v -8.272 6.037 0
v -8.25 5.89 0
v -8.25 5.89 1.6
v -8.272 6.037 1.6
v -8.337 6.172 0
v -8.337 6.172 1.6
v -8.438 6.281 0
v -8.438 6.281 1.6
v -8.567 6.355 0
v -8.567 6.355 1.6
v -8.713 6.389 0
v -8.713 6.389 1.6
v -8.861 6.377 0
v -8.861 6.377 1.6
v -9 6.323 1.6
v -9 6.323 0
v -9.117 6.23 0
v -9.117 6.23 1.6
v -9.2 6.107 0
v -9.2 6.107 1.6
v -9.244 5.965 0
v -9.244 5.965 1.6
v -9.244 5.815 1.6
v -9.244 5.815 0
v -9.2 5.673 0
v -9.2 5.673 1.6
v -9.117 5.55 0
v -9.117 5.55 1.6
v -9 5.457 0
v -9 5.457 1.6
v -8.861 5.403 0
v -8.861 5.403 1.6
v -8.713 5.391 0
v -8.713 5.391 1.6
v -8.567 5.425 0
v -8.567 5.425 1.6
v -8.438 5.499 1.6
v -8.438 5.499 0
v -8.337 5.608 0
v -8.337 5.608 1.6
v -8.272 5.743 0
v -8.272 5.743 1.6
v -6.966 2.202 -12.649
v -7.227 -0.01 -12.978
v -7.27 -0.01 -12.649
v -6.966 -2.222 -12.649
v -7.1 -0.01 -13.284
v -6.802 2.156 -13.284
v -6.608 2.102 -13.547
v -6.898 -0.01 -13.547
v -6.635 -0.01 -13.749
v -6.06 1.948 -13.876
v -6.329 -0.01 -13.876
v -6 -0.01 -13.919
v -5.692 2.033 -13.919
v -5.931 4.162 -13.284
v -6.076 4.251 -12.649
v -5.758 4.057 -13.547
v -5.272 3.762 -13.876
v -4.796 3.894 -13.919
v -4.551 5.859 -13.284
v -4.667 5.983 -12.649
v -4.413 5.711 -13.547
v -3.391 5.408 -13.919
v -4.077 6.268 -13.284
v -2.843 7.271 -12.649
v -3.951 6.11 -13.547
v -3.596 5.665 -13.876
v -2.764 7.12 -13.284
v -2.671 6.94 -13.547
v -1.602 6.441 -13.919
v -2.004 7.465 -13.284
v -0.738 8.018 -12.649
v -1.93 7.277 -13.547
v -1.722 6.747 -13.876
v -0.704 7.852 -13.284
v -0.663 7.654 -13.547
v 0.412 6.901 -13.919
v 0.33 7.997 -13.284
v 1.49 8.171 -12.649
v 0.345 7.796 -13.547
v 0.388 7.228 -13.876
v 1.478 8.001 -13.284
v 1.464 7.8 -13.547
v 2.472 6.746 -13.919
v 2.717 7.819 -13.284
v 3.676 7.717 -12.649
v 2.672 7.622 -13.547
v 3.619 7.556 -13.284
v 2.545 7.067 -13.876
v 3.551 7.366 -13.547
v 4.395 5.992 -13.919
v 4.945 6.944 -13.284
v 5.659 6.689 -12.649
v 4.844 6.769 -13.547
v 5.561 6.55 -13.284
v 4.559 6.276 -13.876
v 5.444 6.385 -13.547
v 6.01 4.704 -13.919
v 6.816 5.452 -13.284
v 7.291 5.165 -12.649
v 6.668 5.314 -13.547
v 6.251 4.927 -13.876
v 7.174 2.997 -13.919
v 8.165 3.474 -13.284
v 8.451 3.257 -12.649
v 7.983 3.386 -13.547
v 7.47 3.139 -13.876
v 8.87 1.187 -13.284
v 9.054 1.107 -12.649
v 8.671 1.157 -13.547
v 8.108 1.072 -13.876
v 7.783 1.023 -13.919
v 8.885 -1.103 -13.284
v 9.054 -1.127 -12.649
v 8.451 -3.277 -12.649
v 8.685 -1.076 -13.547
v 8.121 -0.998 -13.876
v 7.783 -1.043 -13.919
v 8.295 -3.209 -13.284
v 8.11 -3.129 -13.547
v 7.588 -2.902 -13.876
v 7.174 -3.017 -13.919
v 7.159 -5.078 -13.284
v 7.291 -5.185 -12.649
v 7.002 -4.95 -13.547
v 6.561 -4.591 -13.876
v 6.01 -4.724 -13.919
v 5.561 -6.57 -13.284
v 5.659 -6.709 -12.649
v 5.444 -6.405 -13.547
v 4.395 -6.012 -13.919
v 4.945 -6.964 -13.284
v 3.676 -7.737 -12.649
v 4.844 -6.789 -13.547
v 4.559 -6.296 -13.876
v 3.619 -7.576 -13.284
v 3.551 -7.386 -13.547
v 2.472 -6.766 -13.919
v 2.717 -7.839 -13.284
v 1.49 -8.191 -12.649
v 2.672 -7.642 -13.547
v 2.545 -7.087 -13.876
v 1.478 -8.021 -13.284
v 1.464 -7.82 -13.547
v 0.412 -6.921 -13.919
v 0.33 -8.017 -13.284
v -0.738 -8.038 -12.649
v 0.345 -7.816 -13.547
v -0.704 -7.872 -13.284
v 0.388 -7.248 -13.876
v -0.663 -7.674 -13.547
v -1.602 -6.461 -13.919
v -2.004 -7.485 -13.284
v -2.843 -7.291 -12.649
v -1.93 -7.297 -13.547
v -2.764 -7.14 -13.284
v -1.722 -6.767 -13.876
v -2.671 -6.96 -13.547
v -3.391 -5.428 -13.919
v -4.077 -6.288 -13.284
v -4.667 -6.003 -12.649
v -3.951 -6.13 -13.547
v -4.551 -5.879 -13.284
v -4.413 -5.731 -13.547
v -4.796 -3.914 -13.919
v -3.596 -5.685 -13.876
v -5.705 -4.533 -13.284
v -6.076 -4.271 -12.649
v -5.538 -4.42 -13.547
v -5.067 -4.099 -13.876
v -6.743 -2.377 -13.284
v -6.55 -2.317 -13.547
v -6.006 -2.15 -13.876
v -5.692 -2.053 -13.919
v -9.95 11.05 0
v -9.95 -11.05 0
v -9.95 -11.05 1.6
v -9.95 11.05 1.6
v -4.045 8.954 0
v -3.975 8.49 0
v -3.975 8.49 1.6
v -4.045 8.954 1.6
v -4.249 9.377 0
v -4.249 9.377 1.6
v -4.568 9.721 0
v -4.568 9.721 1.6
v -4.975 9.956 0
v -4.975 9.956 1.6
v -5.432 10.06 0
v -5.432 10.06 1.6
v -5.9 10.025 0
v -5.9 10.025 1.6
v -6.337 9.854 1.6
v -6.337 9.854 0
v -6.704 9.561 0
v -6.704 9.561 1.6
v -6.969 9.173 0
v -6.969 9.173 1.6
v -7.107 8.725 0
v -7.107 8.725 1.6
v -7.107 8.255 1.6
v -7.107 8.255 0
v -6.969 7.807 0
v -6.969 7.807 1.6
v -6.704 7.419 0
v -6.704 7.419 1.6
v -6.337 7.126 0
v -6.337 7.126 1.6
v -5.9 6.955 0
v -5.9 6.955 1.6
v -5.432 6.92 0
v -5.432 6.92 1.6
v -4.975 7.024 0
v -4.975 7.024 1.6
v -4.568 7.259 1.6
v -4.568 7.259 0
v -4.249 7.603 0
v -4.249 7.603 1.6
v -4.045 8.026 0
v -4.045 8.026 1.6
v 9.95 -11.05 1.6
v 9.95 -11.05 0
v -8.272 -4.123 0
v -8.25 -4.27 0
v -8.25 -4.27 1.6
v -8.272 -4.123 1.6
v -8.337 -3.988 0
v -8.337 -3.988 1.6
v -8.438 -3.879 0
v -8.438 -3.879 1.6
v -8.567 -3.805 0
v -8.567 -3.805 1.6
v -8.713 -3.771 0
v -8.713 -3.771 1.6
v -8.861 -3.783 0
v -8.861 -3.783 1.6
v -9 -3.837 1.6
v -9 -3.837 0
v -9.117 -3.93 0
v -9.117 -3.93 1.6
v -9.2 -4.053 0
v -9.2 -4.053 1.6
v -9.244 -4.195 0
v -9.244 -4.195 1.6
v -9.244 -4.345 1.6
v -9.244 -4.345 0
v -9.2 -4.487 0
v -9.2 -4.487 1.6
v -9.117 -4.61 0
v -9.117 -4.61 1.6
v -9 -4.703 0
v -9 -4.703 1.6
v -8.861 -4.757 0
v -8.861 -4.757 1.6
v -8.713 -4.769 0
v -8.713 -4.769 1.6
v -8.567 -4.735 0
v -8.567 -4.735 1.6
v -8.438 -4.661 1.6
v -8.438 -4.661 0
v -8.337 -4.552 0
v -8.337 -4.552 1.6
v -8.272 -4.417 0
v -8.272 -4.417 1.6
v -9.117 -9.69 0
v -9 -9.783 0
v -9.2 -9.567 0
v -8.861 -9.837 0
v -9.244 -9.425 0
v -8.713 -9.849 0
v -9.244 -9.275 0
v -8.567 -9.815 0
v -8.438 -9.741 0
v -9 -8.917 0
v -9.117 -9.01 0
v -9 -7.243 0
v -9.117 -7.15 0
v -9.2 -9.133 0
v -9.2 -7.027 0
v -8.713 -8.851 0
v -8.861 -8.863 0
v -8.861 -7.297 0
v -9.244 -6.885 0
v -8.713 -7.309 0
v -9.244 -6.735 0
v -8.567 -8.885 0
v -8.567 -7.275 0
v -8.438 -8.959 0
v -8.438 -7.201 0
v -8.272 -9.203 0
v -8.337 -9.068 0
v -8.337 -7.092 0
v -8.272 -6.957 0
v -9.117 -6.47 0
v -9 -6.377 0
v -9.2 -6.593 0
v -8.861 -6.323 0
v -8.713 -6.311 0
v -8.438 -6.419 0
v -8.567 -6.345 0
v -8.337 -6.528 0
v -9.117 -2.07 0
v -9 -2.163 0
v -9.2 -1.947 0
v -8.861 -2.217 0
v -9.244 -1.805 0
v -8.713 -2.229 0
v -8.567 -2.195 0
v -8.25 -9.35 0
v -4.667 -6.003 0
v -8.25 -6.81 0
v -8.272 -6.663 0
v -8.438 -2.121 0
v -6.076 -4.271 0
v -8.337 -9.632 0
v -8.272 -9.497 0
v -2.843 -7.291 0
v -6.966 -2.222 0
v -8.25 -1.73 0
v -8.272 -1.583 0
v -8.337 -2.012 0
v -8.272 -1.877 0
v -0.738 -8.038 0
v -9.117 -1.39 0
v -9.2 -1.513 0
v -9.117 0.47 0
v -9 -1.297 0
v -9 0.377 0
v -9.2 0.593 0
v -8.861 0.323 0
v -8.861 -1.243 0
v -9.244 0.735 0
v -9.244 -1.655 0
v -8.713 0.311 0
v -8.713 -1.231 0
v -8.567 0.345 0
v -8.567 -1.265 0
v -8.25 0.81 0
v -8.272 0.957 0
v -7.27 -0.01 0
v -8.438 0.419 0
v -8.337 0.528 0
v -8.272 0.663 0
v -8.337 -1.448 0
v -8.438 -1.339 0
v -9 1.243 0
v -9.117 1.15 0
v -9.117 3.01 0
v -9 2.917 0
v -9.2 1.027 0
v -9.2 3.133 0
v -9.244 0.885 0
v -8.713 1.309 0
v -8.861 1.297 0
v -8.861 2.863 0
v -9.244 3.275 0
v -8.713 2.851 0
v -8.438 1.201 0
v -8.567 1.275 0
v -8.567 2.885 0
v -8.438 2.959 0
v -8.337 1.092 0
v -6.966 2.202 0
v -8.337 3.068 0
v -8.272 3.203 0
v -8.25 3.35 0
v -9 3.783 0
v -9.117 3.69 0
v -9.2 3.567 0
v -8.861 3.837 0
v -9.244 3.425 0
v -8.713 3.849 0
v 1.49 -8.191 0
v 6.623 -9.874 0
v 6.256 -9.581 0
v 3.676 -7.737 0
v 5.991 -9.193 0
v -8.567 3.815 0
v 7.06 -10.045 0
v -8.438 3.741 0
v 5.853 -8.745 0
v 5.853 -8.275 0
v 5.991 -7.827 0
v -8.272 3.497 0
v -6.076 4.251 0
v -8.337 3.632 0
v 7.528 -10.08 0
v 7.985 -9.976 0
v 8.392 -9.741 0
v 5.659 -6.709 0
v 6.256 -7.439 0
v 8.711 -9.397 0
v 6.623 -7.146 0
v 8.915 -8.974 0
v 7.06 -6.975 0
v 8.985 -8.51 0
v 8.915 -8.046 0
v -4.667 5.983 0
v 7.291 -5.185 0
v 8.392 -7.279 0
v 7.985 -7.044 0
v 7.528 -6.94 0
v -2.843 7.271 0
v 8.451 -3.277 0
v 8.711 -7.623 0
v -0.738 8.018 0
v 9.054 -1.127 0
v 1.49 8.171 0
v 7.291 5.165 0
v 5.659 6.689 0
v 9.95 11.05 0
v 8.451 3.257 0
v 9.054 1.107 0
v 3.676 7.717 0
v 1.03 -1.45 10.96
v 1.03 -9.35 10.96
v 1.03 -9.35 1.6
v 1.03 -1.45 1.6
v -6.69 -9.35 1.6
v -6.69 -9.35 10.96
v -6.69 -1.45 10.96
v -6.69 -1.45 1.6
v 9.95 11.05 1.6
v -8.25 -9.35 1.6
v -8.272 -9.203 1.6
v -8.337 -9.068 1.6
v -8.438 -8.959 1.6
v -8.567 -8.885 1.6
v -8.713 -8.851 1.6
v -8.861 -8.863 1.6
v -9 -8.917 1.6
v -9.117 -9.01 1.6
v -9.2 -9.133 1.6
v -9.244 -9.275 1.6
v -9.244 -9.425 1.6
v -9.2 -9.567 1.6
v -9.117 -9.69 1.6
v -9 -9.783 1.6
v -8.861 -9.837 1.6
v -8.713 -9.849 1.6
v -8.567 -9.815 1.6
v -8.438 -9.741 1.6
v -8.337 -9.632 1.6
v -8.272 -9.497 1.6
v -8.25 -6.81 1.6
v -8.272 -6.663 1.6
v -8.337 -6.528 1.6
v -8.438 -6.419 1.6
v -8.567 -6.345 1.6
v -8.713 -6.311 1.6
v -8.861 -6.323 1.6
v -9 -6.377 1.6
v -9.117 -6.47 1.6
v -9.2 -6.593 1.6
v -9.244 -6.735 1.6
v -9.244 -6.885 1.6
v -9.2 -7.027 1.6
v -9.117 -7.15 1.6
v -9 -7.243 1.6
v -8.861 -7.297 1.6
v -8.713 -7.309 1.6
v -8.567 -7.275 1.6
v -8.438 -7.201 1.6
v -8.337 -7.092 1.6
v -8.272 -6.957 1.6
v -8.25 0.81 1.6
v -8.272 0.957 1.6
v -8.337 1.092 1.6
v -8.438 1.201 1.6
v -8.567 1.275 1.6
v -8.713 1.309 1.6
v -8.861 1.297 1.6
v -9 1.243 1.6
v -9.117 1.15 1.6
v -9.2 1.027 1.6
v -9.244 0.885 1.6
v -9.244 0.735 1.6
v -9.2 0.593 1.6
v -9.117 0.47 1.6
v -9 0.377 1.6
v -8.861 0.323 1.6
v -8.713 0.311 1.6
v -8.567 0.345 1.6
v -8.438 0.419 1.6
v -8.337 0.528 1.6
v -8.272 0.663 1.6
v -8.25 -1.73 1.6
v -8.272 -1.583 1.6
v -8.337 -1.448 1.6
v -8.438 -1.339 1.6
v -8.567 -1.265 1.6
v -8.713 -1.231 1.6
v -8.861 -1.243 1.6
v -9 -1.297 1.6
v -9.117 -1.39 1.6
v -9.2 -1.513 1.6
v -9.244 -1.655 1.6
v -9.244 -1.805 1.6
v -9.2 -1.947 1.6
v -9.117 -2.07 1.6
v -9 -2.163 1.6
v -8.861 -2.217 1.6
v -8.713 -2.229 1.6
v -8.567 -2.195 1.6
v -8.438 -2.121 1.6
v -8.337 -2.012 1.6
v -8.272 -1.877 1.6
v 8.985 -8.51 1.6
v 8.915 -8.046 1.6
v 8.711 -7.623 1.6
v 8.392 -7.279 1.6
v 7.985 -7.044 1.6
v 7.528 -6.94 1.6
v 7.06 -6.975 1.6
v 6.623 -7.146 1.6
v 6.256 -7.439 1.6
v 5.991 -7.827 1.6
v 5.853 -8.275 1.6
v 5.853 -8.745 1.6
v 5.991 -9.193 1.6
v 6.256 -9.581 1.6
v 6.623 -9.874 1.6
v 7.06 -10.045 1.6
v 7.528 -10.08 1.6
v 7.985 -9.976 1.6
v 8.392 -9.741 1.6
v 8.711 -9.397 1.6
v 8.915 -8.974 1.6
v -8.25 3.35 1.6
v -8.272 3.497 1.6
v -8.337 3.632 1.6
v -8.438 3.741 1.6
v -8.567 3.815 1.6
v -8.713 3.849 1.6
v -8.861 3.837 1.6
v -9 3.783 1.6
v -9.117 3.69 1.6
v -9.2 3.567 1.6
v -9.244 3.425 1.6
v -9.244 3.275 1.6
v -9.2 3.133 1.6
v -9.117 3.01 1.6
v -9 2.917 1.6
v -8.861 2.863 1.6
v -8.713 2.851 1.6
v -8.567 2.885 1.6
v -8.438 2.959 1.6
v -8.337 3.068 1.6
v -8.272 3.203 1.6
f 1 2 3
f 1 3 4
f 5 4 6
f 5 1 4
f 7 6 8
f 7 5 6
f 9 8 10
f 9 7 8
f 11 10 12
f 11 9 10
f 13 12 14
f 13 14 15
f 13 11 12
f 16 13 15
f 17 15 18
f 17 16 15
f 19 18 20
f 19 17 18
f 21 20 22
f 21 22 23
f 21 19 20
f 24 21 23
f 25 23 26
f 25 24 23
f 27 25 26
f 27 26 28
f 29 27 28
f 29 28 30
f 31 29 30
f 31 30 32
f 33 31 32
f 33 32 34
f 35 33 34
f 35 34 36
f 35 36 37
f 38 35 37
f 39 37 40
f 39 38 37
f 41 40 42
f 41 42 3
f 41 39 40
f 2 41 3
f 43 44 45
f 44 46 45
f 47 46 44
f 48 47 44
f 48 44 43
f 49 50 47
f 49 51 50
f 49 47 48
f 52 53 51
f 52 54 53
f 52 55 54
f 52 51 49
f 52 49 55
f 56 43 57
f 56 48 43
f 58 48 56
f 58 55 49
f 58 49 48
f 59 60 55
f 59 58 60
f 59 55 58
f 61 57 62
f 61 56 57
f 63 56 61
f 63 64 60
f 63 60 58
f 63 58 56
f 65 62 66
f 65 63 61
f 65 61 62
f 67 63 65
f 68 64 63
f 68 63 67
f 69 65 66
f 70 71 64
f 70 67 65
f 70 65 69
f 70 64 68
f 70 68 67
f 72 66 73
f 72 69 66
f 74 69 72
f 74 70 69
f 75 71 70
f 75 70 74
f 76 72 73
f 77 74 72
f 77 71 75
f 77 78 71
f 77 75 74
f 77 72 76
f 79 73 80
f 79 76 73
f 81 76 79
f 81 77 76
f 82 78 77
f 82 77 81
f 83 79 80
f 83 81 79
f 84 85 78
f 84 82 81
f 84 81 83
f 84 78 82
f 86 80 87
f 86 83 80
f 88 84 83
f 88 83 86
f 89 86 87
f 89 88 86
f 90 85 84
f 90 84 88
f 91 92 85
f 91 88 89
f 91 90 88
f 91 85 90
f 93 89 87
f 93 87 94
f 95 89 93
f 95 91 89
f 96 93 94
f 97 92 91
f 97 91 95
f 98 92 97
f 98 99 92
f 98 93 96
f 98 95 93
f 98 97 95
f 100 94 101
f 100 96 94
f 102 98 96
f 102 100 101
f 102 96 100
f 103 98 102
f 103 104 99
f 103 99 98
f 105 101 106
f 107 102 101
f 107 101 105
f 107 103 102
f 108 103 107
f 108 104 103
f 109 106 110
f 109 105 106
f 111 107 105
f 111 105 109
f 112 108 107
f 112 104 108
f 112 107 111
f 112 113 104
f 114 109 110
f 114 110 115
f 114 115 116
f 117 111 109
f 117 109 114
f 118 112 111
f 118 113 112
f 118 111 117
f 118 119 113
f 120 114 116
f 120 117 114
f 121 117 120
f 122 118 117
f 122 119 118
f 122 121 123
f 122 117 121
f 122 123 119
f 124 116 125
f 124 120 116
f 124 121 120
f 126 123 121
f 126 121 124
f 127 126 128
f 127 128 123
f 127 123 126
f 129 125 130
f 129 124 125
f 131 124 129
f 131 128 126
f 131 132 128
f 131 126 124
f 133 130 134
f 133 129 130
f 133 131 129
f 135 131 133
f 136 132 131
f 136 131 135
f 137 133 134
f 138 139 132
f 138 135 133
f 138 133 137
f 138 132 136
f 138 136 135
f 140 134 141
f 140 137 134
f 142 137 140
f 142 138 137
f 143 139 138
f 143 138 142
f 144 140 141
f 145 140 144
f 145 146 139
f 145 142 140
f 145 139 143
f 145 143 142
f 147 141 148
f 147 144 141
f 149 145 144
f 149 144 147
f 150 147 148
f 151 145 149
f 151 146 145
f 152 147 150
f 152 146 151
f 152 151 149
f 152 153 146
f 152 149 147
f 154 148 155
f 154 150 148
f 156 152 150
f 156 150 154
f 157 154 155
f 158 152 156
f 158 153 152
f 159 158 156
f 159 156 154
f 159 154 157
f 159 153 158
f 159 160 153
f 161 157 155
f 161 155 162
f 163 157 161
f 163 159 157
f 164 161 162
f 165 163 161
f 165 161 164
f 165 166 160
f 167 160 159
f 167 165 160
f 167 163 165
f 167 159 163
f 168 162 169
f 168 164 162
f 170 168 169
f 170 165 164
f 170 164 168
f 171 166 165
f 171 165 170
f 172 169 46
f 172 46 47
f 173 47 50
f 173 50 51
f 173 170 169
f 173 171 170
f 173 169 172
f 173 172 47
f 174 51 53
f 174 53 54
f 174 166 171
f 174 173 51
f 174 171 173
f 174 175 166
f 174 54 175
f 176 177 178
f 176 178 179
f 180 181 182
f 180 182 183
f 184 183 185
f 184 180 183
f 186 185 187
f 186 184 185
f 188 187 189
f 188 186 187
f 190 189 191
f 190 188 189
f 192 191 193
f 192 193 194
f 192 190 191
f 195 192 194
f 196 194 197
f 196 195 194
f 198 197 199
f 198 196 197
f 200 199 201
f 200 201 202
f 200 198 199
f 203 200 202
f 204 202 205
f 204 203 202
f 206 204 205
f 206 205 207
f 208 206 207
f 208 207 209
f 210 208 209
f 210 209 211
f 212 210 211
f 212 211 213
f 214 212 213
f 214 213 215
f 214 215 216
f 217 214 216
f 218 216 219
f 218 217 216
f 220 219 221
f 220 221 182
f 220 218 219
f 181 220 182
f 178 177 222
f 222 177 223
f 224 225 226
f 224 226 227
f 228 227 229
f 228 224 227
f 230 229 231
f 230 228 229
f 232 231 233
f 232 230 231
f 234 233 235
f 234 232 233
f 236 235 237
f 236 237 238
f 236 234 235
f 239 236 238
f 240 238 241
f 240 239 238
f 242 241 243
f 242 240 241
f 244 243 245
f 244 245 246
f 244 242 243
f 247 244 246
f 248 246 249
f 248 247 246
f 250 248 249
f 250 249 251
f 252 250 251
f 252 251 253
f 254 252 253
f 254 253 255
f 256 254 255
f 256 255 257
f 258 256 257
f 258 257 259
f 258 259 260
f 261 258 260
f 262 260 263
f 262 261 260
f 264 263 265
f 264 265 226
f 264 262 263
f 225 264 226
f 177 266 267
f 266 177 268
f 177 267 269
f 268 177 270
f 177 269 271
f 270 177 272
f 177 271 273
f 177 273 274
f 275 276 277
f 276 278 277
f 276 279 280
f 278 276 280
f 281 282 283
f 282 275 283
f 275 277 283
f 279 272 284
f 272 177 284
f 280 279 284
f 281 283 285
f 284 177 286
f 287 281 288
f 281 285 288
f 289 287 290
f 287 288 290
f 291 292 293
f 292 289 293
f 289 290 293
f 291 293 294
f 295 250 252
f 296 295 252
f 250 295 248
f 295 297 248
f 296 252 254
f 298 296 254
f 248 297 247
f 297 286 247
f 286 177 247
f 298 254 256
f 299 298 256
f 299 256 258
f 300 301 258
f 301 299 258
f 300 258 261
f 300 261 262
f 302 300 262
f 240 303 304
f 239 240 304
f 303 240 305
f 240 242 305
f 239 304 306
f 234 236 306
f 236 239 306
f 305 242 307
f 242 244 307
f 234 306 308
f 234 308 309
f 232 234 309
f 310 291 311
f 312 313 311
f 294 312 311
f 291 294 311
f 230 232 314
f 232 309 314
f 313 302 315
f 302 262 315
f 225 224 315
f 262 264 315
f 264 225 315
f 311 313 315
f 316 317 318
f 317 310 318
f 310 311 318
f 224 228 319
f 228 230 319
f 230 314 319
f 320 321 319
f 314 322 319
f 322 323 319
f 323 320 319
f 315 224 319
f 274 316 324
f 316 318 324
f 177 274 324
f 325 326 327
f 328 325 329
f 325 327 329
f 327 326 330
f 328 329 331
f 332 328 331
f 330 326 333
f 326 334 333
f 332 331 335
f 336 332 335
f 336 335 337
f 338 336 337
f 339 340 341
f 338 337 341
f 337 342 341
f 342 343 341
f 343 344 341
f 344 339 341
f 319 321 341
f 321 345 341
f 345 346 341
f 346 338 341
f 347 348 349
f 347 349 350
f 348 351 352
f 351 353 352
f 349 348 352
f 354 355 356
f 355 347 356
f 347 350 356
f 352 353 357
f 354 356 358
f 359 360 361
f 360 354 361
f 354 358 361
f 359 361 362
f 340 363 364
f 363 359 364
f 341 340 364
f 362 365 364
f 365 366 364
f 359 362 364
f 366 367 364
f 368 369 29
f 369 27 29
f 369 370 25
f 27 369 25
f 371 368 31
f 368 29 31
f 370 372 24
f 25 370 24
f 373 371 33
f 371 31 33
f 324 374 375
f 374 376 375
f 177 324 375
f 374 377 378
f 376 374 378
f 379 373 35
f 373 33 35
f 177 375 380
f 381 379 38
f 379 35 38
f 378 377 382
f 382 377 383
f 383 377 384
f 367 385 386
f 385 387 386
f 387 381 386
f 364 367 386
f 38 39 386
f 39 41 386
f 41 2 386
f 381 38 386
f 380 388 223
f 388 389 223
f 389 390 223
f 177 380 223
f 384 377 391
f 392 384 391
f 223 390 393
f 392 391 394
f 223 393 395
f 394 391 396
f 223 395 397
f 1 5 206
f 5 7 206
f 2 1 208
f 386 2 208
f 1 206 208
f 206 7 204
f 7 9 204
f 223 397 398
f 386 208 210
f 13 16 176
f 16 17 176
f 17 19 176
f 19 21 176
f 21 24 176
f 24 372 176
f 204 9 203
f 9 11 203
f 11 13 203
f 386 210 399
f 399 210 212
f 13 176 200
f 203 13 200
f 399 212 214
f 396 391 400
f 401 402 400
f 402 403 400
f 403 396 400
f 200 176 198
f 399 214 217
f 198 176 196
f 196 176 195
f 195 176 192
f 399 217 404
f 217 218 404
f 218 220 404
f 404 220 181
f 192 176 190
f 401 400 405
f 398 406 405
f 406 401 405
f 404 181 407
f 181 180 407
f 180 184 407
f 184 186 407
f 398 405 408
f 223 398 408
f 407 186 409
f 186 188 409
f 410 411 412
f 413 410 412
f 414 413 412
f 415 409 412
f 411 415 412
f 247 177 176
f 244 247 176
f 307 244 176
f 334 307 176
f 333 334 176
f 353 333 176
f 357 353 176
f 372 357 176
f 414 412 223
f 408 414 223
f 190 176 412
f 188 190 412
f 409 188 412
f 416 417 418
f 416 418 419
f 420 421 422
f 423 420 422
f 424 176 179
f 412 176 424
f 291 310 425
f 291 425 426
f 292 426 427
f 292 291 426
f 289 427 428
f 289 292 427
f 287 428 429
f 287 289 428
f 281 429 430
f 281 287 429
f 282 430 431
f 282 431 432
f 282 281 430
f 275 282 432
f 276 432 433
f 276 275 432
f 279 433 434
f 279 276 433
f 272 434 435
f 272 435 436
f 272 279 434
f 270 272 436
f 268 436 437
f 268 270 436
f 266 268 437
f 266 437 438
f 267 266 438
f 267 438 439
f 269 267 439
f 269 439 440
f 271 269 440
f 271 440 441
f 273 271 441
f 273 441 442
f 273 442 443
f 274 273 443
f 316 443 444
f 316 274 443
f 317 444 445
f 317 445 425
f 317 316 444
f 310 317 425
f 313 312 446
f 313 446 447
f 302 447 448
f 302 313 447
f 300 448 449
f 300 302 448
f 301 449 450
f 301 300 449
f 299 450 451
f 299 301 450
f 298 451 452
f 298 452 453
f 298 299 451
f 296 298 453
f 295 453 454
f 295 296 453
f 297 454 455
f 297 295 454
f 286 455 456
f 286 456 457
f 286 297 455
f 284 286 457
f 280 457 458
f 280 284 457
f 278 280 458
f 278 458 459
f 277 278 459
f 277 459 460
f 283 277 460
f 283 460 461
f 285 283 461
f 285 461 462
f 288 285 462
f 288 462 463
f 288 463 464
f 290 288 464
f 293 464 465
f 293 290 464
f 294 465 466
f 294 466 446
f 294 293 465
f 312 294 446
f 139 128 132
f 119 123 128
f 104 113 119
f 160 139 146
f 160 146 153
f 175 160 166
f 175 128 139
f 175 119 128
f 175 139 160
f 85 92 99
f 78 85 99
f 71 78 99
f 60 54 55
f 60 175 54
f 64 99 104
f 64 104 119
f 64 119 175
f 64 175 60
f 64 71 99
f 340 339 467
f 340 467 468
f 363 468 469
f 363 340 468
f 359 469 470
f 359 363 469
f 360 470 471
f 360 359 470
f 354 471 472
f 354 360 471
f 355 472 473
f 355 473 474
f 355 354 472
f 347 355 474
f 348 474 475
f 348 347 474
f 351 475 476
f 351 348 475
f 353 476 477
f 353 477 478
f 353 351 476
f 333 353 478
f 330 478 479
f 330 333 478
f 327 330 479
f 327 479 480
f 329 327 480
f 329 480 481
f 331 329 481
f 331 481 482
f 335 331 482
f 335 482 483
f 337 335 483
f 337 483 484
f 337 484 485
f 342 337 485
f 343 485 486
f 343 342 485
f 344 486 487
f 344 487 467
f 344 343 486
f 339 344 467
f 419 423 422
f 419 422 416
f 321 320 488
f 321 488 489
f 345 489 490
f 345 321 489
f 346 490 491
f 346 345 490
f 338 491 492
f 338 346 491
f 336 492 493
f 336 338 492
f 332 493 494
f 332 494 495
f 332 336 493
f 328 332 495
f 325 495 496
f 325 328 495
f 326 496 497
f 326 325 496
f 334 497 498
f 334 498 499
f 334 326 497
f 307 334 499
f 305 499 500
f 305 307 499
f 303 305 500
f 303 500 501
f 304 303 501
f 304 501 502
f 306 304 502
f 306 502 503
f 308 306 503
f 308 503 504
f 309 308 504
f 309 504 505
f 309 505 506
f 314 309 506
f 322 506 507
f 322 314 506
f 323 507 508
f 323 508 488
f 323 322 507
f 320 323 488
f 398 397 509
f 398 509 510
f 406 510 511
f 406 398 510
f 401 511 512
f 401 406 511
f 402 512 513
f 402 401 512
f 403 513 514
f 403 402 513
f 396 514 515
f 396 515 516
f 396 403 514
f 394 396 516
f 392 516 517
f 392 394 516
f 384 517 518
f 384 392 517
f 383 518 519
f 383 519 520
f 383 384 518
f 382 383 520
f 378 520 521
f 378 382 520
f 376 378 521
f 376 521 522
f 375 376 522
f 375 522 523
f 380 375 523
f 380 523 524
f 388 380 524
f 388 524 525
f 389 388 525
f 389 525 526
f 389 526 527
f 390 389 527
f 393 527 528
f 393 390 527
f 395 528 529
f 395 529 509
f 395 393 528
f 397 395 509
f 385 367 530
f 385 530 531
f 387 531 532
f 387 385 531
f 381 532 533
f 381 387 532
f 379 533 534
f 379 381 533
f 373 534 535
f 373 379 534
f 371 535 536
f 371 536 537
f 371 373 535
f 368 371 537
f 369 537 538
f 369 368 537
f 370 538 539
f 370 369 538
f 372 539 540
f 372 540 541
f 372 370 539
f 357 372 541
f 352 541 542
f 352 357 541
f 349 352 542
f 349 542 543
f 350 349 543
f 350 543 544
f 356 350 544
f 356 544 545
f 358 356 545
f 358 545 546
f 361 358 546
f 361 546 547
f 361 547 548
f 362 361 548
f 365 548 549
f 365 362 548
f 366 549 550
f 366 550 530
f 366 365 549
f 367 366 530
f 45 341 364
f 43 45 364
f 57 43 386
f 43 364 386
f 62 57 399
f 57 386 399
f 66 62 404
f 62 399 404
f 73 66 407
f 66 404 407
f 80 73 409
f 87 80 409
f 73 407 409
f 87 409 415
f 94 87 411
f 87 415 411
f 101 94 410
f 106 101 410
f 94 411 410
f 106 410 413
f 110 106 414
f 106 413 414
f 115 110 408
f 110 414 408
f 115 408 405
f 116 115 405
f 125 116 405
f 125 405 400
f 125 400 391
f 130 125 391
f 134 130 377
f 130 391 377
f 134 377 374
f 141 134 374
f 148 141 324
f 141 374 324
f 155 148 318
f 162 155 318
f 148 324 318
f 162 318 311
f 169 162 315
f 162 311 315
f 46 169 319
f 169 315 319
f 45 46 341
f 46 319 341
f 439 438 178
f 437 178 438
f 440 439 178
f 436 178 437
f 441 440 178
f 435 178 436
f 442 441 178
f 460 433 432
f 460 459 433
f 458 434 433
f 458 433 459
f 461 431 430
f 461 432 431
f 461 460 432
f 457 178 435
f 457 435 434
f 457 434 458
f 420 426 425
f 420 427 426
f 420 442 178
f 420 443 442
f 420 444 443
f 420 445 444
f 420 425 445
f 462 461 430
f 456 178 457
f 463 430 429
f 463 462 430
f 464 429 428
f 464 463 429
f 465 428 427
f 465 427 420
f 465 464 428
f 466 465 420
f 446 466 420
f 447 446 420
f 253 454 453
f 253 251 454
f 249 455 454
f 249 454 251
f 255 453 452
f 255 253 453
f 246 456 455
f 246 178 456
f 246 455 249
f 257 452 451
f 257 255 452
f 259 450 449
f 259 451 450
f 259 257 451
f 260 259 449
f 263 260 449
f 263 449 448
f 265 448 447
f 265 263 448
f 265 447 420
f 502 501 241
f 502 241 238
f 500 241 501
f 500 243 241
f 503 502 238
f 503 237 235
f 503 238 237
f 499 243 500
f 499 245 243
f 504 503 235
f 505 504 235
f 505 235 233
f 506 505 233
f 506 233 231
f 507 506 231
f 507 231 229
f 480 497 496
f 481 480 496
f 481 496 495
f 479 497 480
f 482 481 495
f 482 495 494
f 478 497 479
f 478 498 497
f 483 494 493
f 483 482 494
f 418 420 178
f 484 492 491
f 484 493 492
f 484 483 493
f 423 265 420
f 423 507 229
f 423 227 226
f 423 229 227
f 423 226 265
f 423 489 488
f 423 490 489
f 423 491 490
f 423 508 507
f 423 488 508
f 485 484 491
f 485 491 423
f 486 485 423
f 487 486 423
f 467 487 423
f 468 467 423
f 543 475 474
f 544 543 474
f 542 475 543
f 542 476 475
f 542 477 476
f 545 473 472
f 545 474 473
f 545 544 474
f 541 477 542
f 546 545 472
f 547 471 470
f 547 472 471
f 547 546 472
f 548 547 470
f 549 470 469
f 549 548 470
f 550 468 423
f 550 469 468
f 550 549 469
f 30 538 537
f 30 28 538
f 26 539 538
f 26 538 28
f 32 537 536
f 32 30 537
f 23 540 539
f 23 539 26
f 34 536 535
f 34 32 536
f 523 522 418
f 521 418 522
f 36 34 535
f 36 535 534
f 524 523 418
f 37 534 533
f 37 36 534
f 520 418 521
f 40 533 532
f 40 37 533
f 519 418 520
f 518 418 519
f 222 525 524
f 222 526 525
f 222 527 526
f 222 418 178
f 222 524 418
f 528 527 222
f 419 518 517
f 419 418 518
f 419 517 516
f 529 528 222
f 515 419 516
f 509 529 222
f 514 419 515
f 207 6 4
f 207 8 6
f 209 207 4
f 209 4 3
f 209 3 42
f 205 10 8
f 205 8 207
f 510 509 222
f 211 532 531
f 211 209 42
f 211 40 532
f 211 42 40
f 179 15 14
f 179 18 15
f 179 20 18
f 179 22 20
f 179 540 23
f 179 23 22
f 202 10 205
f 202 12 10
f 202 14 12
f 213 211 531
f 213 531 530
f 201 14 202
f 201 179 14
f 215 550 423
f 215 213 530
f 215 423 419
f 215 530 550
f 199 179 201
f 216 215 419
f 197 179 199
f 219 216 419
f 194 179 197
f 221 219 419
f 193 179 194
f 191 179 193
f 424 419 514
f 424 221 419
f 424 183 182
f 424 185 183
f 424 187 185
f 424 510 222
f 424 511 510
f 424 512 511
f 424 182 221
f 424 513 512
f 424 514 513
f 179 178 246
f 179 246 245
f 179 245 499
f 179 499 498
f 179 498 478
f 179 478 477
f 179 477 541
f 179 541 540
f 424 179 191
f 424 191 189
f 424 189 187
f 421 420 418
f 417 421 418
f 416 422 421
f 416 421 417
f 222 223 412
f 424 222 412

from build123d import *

# Parameters (mm, degrees)
SKETCH1_W           = 19.9
SKETCH1_H           = 22.1
SKETCH1_R           = 1.5748
SKETCH1_R_2         = 0.5
BOSS_EXTRUDE1_DEPTH = 1.6
SKETCH2_R           = 8.2
BOSS_EXTRUDE2_DEPTH = 13.9192
FILLET2_R           = 1.27
SKETCH3_W           = 7.72
SKETCH3_H           = 7.9
BOSS_EXTRUDE3_DEPTH = 9.36


with BuildPart() as part:
    # Sketch1 → Boss-Extrude1 (new body)
    with BuildSketch(Plane.XY):
        Rectangle(SKETCH1_W, SKETCH1_H)
        with Locations((-5.55, 8.49)):
            Circle(SKETCH1_R, mode=Mode.SUBTRACT)
        with Locations((7.41, -8.51)):
            Circle(SKETCH1_R, mode=Mode.SUBTRACT)
        with Locations((-8.75, -9.35)):
            Circle(SKETCH1_R_2, mode=Mode.SUBTRACT)
        with Locations((-8.75, -6.81)):
            Circle(SKETCH1_R_2, mode=Mode.SUBTRACT)
        with Locations((-8.75, -4.27)):
            Circle(SKETCH1_R_2, mode=Mode.SUBTRACT)
        with Locations((-8.75, -1.73)):
            Circle(SKETCH1_R_2, mode=Mode.SUBTRACT)
        with Locations((-8.75, 0.81)):
            Circle(SKETCH1_R_2, mode=Mode.SUBTRACT)
        with Locations((-8.75, 3.35)):
            Circle(SKETCH1_R_2, mode=Mode.SUBTRACT)
        with Locations((-8.75, 5.89)):
            Circle(SKETCH1_R_2, mode=Mode.SUBTRACT)
    extrude(amount=BOSS_EXTRUDE1_DEPTH)

    # Sketch2 → Boss-Extrude2 (add)
    with BuildSketch(Plane(origin=(0, 0, 0), x_dir=(-1, 0, 0), z_dir=(0, 0, -1))):
        with Locations((-0.93, -0.01)):
            Circle(SKETCH2_R)
    extrude(amount=BOSS_EXTRUDE2_DEPTH)

    # Fillet2
    fillet2_edges = [part.edges().sort_by_distance(p)[0] for p in [
        (9.13, -0.01, -13.9192),
    ]]
    fillet(fillet2_edges, radius=FILLET2_R)

    # Sketch3 → Boss-Extrude3 (add)
    with BuildSketch(Plane.XY.offset(1.6)):
        with Locations((-2.83, -5.4)):
            Rectangle(SKETCH3_W, SKETCH3_H)
    extrude(amount=BOSS_EXTRUDE3_DEPTH)


solid = part.part
